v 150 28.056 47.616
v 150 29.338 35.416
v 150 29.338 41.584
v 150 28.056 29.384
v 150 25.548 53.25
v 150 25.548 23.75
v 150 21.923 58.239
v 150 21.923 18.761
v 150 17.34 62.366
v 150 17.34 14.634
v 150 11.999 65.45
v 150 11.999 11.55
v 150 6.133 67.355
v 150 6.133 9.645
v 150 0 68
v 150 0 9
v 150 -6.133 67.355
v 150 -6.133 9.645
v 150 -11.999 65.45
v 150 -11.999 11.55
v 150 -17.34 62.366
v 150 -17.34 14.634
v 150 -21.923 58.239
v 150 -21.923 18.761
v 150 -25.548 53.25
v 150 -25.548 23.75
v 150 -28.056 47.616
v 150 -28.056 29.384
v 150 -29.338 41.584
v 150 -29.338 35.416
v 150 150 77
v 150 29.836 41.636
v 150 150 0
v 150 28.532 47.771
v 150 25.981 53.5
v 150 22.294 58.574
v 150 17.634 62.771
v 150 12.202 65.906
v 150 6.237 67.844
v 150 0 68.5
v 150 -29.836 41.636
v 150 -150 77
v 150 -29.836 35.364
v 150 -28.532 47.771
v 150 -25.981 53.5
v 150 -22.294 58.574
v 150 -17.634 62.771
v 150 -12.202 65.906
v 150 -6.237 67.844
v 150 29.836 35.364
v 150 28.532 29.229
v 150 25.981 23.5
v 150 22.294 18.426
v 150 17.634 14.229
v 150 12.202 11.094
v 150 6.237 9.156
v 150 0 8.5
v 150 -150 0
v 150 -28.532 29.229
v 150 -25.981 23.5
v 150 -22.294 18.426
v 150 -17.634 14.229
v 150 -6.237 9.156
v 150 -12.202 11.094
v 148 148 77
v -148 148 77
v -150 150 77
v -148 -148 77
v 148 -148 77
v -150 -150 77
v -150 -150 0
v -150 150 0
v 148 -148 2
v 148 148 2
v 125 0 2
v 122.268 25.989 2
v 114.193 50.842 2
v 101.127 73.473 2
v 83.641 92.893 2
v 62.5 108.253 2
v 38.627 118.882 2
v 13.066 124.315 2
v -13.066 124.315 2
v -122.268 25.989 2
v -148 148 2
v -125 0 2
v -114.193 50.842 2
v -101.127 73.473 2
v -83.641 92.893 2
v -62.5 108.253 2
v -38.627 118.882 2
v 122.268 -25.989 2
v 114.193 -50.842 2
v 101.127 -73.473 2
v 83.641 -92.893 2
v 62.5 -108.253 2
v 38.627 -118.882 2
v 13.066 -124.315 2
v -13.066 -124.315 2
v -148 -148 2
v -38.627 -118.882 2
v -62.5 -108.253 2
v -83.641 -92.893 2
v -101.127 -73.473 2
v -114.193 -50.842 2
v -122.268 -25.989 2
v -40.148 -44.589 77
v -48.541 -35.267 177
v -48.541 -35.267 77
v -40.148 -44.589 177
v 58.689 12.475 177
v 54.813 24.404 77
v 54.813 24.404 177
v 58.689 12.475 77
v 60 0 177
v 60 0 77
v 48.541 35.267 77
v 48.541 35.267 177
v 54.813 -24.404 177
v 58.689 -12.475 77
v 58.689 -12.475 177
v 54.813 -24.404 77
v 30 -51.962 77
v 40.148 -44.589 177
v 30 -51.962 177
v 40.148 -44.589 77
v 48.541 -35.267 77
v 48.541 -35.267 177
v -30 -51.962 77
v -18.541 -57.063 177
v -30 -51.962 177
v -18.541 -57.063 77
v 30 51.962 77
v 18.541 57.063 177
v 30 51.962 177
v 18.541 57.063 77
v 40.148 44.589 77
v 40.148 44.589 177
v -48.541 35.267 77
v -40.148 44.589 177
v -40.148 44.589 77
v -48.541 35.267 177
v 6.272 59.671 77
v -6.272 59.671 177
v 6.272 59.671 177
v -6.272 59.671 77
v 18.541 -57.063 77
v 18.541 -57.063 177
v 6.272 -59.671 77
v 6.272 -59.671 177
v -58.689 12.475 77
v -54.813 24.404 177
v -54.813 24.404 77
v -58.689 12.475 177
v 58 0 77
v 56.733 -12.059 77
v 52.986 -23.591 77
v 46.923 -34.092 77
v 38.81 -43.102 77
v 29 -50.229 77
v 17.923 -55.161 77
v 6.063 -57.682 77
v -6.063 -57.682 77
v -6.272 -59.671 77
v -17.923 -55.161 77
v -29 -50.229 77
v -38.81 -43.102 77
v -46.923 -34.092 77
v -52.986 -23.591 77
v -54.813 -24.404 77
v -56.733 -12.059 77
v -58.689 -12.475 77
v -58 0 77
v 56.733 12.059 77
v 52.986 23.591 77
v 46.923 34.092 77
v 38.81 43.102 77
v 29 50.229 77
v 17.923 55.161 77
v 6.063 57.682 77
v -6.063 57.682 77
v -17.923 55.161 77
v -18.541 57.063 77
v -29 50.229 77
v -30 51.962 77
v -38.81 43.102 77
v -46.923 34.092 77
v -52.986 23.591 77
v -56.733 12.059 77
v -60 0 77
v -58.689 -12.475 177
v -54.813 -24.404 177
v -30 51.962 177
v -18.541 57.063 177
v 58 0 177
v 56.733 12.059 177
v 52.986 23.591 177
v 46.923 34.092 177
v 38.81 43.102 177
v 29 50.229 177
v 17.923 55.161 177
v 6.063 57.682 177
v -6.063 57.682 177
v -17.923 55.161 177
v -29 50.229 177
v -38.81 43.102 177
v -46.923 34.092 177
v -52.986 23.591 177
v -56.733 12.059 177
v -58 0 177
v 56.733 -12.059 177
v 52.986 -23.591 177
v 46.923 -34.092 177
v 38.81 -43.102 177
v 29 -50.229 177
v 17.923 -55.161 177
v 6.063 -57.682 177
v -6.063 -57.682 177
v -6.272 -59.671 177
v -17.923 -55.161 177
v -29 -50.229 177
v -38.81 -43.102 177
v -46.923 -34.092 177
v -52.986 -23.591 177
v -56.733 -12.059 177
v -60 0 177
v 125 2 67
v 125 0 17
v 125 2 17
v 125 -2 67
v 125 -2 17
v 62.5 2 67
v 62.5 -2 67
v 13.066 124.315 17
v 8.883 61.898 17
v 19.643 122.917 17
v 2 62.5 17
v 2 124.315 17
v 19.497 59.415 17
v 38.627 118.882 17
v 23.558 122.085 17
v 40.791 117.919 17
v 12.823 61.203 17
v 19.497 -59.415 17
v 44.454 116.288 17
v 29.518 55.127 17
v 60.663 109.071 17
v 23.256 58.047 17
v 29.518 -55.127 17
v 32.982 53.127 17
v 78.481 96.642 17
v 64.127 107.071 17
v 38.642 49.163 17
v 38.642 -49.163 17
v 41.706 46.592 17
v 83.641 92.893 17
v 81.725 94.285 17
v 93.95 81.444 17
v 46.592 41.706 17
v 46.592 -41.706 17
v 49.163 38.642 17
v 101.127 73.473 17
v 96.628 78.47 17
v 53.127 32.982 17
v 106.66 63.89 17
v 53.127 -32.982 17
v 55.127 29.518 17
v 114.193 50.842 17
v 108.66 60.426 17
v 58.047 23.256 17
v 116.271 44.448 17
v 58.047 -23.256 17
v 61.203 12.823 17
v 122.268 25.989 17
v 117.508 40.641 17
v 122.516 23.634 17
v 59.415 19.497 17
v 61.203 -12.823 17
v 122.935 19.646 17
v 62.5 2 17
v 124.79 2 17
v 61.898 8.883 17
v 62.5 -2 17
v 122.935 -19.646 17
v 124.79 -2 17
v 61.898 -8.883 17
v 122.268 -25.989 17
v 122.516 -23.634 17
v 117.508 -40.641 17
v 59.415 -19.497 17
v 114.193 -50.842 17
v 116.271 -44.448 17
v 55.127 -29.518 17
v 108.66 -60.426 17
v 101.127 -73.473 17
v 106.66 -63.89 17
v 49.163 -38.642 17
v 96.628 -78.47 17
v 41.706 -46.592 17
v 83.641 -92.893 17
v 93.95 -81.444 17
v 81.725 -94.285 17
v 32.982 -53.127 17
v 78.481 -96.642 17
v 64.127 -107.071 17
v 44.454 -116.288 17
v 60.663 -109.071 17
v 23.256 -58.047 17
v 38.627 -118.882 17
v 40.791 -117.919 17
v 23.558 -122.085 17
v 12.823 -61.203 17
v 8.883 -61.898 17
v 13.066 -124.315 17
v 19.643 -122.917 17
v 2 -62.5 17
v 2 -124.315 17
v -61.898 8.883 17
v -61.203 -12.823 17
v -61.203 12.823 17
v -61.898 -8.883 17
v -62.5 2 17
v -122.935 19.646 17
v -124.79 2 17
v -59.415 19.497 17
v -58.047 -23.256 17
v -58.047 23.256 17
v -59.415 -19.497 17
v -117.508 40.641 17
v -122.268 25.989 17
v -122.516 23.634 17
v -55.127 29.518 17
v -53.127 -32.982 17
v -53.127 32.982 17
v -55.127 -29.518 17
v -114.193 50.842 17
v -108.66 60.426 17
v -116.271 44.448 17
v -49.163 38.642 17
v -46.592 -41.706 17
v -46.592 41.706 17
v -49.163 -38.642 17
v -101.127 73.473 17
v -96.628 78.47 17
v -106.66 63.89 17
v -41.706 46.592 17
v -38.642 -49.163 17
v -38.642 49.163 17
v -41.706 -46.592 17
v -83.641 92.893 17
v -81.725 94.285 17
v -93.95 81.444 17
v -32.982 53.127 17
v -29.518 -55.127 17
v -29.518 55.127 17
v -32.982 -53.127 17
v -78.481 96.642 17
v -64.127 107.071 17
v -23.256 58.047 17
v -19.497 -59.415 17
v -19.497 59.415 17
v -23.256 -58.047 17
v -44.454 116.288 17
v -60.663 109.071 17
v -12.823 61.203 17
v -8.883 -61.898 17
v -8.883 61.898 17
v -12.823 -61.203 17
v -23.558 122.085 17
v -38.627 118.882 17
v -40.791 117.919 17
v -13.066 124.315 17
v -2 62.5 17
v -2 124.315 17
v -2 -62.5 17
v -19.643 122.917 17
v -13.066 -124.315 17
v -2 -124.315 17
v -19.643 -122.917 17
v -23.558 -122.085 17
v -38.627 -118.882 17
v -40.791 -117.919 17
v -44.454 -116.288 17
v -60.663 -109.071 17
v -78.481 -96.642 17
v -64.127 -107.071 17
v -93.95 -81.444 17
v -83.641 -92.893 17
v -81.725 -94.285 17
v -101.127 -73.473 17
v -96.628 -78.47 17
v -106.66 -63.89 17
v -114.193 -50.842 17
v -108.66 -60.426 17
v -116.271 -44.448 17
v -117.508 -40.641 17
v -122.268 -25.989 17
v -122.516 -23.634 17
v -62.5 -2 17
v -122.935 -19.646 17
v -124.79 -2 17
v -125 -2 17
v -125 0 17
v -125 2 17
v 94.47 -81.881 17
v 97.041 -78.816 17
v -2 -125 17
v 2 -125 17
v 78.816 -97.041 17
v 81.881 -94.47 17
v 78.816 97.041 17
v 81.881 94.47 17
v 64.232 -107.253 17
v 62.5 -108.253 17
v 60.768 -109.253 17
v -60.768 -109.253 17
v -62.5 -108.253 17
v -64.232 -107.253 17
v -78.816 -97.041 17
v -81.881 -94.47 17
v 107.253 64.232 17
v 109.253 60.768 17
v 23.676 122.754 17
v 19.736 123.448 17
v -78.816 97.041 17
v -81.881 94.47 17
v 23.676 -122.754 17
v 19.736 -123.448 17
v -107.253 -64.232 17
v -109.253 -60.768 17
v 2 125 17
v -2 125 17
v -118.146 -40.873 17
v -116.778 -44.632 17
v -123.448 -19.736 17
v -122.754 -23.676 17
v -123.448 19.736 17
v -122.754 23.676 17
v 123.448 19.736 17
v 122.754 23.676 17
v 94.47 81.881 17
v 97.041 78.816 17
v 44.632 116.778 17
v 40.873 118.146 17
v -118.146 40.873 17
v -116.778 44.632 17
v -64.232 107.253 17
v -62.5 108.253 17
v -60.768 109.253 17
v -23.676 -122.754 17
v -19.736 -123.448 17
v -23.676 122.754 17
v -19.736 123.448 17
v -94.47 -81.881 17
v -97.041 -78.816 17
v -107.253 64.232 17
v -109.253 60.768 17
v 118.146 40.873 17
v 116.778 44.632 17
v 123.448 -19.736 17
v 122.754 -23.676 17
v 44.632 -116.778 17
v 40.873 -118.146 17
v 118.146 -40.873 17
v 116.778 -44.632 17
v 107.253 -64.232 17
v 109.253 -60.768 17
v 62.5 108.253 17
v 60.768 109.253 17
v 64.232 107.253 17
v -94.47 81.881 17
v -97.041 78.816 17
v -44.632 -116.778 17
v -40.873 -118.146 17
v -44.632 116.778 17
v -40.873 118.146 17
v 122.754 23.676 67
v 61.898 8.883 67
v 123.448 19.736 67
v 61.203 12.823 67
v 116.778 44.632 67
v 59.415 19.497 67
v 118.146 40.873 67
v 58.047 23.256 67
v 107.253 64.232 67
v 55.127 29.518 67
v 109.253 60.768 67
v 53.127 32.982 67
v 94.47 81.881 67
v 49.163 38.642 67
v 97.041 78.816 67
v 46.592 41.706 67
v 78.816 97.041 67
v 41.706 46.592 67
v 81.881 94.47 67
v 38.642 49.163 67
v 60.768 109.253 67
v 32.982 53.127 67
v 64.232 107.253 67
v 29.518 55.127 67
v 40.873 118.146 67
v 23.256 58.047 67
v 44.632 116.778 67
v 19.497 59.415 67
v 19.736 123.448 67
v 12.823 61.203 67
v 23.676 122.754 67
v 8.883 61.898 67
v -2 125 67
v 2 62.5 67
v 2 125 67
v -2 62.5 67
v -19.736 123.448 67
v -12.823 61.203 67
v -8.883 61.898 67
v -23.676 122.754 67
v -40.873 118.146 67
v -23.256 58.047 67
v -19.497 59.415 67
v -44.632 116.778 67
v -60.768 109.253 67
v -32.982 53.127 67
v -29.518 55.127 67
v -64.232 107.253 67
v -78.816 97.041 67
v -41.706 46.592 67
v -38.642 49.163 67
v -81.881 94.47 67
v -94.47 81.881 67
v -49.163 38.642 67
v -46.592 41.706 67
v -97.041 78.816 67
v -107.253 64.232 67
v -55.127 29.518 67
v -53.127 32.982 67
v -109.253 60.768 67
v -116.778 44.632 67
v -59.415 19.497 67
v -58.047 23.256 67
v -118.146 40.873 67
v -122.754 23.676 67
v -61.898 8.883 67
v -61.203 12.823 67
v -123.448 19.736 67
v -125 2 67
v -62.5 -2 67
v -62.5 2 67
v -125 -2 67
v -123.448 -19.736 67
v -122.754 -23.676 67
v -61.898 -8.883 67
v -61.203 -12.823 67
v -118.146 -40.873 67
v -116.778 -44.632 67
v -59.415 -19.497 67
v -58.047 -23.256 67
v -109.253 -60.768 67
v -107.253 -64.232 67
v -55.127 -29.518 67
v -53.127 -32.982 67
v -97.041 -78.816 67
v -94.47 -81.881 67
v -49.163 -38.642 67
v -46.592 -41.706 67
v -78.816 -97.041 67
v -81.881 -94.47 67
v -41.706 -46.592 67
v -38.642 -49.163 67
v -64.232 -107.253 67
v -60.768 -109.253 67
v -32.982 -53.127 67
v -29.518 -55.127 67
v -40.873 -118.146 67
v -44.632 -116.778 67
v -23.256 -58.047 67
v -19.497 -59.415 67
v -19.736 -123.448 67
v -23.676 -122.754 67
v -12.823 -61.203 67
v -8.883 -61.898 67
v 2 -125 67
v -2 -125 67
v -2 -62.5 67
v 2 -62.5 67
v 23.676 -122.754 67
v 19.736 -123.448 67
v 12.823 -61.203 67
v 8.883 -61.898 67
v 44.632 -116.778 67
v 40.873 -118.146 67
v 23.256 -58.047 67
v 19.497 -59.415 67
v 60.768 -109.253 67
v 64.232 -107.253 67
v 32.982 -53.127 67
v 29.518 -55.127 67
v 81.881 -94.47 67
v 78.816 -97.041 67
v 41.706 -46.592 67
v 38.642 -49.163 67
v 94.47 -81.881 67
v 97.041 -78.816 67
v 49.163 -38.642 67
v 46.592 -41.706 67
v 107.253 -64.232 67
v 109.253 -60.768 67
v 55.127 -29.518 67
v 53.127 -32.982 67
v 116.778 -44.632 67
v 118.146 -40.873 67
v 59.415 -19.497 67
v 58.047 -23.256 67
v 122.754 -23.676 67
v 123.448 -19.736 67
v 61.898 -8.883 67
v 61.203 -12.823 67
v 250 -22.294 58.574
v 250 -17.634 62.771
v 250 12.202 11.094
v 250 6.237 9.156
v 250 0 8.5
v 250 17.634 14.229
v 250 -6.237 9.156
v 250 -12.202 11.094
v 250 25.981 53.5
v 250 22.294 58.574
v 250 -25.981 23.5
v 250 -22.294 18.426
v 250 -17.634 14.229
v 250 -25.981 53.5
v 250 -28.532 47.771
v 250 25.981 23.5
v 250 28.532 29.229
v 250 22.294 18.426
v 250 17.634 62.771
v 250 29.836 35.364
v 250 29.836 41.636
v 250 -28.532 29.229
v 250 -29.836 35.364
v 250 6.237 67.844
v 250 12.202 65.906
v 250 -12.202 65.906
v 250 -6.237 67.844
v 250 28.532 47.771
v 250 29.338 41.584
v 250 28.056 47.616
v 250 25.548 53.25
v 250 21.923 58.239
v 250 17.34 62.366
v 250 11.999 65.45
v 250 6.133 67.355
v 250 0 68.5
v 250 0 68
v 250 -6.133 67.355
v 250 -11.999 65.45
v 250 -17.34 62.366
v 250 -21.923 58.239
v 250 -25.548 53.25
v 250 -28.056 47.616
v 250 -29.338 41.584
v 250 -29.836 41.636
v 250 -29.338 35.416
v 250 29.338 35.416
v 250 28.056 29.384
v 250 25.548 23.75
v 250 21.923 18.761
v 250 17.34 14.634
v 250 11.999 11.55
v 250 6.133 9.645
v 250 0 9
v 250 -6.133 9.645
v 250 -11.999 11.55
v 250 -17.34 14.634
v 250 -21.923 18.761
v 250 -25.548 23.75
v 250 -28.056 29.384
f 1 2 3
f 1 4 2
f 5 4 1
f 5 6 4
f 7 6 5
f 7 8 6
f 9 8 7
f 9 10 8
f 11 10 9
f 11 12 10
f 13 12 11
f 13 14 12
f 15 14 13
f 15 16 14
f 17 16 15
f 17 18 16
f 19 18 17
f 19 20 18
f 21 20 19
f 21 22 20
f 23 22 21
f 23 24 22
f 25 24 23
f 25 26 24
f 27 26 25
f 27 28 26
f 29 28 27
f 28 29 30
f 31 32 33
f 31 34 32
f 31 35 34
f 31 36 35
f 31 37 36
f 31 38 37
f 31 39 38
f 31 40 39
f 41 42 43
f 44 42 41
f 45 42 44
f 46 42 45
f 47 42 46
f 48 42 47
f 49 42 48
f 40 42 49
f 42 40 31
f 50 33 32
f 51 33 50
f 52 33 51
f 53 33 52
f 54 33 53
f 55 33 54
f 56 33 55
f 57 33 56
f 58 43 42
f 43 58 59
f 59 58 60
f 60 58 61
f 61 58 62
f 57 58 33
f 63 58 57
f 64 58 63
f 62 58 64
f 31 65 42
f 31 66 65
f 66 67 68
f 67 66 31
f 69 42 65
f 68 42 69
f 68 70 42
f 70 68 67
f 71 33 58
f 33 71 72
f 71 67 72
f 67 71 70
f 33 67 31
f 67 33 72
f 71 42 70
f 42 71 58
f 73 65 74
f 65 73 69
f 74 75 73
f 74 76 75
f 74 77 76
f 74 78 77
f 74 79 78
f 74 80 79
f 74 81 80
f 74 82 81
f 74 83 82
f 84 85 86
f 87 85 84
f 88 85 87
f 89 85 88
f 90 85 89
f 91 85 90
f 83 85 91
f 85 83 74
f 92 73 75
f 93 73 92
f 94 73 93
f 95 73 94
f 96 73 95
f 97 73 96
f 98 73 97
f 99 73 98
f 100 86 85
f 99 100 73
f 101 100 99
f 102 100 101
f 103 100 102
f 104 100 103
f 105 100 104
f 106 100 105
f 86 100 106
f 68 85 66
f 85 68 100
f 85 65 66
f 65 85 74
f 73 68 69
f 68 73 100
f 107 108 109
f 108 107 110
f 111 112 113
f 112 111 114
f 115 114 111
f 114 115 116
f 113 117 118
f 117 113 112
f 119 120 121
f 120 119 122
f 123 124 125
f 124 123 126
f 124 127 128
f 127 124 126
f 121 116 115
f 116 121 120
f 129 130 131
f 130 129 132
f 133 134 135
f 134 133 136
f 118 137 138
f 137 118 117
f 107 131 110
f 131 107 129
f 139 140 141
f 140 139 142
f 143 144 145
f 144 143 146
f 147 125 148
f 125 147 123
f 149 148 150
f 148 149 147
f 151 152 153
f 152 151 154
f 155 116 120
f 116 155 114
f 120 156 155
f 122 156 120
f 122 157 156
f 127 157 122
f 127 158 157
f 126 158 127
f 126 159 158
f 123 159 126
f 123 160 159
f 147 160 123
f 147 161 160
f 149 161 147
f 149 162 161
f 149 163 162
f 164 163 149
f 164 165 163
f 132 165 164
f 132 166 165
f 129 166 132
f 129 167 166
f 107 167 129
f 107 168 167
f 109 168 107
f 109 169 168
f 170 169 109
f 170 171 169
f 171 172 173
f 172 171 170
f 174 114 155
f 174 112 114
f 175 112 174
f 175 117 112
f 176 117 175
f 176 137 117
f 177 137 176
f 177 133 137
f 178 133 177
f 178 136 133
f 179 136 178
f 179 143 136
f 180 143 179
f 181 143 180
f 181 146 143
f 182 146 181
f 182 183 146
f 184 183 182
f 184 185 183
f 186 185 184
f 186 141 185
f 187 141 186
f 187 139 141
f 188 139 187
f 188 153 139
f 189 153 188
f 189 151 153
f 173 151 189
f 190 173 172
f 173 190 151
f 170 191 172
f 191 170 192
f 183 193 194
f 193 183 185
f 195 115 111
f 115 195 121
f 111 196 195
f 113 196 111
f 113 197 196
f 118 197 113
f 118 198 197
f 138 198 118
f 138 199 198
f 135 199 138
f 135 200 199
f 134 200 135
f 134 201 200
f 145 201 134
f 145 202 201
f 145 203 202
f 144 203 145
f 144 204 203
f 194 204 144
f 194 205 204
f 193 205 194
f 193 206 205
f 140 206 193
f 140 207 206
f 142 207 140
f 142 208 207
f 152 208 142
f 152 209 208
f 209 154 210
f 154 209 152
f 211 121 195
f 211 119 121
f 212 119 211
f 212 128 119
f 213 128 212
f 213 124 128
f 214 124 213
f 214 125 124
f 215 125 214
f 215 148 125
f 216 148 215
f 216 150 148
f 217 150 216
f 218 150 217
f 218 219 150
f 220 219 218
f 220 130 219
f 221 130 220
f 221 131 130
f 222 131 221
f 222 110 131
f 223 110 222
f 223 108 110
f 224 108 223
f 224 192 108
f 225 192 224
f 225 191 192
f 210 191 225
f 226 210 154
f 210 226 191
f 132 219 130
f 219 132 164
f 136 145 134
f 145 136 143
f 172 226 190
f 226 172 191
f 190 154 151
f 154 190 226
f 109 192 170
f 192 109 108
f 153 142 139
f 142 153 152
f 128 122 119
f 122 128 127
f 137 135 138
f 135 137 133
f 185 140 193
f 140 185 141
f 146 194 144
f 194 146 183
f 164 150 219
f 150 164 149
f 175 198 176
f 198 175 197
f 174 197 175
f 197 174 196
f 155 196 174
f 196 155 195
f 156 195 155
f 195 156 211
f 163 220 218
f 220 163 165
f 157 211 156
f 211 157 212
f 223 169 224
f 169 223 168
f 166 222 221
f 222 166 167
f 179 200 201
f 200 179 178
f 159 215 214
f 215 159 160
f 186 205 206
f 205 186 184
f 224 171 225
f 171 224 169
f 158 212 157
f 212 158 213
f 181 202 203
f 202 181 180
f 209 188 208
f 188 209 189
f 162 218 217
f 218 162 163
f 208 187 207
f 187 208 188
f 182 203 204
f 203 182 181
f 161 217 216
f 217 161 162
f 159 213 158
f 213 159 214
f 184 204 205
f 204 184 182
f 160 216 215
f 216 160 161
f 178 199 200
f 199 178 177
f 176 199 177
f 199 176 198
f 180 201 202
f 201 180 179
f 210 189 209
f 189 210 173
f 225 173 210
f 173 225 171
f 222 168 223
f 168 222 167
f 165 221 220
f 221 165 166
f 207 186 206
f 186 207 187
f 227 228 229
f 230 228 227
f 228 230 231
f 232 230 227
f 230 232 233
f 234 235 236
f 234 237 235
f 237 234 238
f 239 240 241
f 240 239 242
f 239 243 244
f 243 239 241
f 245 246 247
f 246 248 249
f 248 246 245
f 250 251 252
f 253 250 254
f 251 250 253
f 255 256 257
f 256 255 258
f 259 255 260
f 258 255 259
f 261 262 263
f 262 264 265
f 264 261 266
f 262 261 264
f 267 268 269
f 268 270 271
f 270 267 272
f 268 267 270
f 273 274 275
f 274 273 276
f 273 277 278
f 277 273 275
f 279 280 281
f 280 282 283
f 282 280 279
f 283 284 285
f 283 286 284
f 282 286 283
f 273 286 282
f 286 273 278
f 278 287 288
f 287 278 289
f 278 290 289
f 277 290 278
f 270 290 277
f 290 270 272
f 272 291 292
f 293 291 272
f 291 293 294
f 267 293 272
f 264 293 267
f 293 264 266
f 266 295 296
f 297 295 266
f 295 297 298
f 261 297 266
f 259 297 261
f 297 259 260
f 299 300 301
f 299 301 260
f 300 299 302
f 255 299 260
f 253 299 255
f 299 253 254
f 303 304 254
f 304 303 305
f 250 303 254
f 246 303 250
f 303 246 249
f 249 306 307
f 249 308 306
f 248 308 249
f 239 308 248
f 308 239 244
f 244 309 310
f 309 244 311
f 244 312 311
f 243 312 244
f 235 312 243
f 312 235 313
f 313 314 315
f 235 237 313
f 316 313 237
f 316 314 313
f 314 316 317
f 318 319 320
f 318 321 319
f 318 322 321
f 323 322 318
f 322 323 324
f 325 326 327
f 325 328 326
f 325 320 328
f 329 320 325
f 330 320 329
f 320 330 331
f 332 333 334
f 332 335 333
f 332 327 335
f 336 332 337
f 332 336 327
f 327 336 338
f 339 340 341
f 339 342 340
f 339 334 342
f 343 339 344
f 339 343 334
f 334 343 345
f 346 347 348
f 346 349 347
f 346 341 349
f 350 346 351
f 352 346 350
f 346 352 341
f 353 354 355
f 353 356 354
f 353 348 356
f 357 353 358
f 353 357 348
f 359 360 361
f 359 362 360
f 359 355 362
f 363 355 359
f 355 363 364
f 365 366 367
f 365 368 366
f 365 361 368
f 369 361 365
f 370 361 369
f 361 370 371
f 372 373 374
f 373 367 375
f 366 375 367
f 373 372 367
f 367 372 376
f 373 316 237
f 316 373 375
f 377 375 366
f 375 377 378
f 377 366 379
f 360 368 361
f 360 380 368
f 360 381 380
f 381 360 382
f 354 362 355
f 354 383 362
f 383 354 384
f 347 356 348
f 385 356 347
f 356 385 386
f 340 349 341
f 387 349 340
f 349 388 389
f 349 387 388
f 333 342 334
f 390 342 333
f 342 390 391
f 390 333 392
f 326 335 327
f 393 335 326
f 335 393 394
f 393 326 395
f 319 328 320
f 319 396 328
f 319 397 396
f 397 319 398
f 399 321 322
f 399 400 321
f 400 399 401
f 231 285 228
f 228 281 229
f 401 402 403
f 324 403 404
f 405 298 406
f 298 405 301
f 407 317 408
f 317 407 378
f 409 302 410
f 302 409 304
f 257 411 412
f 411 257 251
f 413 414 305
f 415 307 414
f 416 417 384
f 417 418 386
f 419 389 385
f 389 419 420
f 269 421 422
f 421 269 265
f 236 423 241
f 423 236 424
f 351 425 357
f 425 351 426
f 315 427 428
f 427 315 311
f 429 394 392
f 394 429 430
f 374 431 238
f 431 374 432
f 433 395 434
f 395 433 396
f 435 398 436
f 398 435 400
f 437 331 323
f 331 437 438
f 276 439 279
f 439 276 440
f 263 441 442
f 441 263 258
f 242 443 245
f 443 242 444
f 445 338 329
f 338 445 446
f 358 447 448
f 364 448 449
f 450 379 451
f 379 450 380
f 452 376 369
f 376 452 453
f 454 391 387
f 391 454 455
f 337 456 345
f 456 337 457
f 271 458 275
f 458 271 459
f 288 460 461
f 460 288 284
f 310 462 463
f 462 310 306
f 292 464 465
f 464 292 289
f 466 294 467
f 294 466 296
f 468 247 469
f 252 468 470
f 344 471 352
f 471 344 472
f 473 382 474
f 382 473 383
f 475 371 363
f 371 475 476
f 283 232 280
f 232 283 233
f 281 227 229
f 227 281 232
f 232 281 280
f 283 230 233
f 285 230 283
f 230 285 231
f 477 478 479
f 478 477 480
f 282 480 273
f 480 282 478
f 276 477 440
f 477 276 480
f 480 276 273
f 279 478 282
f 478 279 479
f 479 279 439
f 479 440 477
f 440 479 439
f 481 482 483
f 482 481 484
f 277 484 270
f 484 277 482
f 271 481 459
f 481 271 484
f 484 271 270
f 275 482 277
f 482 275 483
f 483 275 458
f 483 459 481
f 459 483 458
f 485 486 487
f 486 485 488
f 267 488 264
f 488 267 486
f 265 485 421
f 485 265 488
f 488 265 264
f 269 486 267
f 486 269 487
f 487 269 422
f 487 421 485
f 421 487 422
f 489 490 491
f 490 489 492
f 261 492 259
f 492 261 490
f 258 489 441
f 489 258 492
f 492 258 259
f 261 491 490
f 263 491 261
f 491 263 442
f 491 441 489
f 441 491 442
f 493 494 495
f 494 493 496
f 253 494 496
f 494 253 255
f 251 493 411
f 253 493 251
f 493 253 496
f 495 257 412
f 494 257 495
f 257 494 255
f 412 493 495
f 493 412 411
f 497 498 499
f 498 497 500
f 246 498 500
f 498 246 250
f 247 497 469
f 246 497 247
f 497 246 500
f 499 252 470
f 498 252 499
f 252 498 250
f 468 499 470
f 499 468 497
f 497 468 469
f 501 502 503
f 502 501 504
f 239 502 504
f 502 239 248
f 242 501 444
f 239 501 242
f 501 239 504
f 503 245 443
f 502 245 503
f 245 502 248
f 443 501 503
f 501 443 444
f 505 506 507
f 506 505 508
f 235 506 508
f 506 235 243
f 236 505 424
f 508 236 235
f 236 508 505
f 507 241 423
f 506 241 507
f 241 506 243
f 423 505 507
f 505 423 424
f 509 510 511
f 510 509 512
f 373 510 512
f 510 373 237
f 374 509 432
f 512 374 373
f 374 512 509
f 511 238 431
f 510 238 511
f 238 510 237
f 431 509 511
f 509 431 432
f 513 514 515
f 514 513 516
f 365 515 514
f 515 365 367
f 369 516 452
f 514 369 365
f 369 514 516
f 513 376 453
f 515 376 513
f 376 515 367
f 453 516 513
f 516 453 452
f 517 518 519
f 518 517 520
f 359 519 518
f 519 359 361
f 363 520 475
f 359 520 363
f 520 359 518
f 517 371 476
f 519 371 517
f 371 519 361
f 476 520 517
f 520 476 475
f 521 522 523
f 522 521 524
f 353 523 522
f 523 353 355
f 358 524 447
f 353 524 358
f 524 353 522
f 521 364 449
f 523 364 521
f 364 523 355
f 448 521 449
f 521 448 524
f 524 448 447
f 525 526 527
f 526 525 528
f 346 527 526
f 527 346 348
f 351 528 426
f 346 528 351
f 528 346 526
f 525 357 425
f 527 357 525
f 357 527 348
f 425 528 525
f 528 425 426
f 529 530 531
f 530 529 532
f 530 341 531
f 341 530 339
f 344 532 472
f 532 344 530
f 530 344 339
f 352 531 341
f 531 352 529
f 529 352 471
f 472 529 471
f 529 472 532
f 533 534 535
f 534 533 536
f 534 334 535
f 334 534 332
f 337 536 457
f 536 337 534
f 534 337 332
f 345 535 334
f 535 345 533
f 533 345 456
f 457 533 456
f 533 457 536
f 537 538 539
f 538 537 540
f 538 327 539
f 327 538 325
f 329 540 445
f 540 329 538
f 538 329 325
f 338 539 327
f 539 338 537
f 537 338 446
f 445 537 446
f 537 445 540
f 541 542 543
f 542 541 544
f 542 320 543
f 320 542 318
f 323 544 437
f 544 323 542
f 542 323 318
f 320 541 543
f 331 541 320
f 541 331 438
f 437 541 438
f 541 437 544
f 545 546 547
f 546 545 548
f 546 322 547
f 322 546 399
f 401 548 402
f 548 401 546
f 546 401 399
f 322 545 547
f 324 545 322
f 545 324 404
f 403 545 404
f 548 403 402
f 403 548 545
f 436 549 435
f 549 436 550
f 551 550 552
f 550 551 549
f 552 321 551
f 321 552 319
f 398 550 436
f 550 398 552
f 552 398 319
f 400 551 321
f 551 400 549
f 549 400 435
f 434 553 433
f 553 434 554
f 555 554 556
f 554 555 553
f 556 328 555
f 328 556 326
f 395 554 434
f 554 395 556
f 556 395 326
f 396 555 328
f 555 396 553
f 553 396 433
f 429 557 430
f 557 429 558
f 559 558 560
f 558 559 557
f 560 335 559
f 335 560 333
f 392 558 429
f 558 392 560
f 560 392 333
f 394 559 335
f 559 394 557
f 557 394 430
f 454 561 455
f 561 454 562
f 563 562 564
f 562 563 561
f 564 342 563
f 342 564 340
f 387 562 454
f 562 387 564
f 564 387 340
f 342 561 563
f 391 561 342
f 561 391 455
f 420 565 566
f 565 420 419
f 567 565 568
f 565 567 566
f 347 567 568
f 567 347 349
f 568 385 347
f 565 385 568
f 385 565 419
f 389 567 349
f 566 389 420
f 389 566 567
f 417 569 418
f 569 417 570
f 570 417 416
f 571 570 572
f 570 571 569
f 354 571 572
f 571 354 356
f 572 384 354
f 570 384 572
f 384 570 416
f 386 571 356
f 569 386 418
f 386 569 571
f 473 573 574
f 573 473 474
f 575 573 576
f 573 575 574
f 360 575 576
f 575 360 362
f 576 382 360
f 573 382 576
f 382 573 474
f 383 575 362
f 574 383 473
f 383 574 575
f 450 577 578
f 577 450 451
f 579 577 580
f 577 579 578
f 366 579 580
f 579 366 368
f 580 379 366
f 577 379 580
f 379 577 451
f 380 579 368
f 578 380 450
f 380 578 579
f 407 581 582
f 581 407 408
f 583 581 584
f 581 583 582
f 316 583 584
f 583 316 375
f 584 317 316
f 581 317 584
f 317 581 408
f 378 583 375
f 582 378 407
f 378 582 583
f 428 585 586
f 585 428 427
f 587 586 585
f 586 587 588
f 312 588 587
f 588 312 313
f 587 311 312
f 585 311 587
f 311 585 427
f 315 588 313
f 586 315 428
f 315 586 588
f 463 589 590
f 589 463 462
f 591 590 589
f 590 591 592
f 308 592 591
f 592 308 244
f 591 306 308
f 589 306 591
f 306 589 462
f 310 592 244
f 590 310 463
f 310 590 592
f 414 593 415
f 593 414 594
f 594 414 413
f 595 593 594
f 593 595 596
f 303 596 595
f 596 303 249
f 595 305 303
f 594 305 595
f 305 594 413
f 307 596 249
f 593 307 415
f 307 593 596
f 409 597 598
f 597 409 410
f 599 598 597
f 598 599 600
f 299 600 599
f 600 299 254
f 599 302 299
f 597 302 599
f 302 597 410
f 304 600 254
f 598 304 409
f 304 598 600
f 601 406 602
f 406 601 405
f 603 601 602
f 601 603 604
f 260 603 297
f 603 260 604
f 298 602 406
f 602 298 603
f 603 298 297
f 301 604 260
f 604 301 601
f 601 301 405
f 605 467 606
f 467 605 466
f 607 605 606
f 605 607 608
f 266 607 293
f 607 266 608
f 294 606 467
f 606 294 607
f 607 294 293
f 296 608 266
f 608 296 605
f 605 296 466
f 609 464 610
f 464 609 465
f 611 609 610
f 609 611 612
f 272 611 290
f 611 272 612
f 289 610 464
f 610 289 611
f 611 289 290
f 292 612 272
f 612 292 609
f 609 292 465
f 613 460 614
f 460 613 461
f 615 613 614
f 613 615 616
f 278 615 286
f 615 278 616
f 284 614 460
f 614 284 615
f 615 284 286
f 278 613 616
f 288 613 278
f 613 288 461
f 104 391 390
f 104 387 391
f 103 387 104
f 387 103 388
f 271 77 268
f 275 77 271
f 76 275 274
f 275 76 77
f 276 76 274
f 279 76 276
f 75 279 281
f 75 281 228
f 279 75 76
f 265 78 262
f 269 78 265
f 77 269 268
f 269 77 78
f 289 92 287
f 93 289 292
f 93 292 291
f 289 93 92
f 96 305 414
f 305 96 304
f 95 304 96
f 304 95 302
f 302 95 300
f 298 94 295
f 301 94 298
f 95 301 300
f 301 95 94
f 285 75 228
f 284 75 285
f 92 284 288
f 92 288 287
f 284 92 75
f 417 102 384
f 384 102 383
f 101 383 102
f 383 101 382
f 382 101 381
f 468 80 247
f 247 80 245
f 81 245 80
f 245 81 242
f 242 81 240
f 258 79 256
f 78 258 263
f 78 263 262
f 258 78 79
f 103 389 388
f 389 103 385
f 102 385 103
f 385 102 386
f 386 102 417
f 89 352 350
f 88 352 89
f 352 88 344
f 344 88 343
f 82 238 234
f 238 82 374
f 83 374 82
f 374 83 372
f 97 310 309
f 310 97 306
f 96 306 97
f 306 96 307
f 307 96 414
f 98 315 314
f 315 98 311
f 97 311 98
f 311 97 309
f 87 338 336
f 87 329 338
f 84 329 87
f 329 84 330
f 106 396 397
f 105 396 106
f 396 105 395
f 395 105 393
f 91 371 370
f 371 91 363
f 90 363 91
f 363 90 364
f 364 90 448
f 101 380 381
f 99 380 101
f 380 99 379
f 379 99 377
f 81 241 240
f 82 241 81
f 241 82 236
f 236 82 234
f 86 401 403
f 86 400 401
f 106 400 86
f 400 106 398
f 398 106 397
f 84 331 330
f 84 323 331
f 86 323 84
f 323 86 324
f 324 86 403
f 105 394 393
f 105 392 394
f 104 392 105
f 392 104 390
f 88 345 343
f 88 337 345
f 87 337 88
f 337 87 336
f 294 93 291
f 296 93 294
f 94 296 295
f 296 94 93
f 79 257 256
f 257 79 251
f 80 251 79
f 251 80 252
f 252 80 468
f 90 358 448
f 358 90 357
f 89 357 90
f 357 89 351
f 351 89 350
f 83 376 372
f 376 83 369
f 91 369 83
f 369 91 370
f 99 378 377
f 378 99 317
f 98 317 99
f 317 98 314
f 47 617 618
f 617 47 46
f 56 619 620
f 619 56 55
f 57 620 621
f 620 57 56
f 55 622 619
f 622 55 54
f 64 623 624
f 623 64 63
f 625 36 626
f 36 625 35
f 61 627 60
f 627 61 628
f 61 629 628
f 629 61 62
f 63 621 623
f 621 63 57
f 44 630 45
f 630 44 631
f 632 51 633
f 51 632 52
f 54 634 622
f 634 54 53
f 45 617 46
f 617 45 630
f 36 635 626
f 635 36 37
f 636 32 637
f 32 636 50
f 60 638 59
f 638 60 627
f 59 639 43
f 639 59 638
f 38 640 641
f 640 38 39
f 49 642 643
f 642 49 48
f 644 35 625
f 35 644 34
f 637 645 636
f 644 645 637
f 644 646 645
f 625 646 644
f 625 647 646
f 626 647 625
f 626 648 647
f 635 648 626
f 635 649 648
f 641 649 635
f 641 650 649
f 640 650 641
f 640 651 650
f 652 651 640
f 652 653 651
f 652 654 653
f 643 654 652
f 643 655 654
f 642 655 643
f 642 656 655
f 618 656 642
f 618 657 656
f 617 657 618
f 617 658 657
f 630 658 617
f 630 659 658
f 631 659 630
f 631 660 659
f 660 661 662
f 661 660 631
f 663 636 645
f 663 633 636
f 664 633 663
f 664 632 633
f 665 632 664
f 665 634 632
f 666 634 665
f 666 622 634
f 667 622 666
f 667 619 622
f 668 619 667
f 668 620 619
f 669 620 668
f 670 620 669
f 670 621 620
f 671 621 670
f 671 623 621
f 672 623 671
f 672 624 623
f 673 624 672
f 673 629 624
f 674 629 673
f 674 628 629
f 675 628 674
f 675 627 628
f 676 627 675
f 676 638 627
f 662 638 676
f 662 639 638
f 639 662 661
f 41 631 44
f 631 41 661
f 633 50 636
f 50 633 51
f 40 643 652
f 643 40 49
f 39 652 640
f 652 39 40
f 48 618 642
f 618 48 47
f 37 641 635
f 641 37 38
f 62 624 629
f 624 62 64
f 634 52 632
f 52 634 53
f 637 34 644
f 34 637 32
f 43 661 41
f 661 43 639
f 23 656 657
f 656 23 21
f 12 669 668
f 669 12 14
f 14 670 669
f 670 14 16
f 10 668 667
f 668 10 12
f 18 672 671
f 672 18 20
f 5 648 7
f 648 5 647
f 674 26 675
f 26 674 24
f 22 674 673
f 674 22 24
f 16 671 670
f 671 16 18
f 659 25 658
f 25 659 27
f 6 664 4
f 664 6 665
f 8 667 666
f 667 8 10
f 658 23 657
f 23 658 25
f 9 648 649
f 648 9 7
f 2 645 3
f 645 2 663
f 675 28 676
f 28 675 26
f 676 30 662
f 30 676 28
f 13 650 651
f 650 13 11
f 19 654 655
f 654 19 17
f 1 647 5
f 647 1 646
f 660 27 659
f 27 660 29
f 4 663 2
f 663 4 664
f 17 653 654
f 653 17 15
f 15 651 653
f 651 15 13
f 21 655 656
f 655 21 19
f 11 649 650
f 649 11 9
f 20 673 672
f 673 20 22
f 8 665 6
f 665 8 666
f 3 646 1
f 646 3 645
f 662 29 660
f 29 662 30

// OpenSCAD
intake_material_thickness=2;
intake_diameter=120;
intake_length=100;

outake_diameter=60;
outake_length=100;

fan_diameter_inner = 125;
fan_diameter_outer = 250;
fan_base_thickness = 15;
fan_blades = 36;
fan_blade_thickness = 4;
fan_height = 50;

box_size = 300;




module intake_assembly() {
	box_height = intake_material_thickness + fan_base_thickness + fan_height + 10;

	module intake_box() {
		translate([-box_size/2,-box_size/2,0]) {
			difference() {
				cube([box_size,box_size,box_height]);
				translate([
					intake_material_thickness, 
					intake_material_thickness, 
					intake_material_thickness])
				cube([
					box_size-intake_material_thickness*2,
					box_size-intake_material_thickness*2,
					box_height-intake_material_thickness]);
			}
		}
	}

	module intake_port() {
		translate([0,0, box_height])
		difference() {
			cylinder(h=intake_length, d=intake_diameter);
			cylinder(
				h=intake_length, 
				d=intake_diameter-intake_material_thickness*2
			);
		}
	}
	
	module intake_fan() {
		module fan_blade() {
			translate([fan_diameter_inner/2, -fan_blade_thickness/2, 0])
			cube([
				(fan_diameter_outer-fan_diameter_inner)/2,
				fan_blade_thickness,
				fan_height
			]);
		}

		translate([0,0,intake_material_thickness]) {
			cylinder(h=fan_base_thickness, d=fan_diameter_outer);

			translate([0,0,fan_base_thickness]) {
			for(i=[0:fan_blades])
				rotate([0,0, (360/fan_blades)*i]) {
				fan_blade();
				}
			}

		}

	}

	module output_port() {
		translate([box_size/2,0,(box_height)/2]) {
			rotate([0,90,0])
			difference() {
			cylinder(
				h=outake_length,
				d=outake_diameter
			);
			cylinder(
				h=outake_length,
				d=outake_diameter - intake_material_thickness/2
			);
			}
			
		}
	}

	intake_box();
	intake_port();
	intake_fan();
	output_port();
}

intake_assembly();
